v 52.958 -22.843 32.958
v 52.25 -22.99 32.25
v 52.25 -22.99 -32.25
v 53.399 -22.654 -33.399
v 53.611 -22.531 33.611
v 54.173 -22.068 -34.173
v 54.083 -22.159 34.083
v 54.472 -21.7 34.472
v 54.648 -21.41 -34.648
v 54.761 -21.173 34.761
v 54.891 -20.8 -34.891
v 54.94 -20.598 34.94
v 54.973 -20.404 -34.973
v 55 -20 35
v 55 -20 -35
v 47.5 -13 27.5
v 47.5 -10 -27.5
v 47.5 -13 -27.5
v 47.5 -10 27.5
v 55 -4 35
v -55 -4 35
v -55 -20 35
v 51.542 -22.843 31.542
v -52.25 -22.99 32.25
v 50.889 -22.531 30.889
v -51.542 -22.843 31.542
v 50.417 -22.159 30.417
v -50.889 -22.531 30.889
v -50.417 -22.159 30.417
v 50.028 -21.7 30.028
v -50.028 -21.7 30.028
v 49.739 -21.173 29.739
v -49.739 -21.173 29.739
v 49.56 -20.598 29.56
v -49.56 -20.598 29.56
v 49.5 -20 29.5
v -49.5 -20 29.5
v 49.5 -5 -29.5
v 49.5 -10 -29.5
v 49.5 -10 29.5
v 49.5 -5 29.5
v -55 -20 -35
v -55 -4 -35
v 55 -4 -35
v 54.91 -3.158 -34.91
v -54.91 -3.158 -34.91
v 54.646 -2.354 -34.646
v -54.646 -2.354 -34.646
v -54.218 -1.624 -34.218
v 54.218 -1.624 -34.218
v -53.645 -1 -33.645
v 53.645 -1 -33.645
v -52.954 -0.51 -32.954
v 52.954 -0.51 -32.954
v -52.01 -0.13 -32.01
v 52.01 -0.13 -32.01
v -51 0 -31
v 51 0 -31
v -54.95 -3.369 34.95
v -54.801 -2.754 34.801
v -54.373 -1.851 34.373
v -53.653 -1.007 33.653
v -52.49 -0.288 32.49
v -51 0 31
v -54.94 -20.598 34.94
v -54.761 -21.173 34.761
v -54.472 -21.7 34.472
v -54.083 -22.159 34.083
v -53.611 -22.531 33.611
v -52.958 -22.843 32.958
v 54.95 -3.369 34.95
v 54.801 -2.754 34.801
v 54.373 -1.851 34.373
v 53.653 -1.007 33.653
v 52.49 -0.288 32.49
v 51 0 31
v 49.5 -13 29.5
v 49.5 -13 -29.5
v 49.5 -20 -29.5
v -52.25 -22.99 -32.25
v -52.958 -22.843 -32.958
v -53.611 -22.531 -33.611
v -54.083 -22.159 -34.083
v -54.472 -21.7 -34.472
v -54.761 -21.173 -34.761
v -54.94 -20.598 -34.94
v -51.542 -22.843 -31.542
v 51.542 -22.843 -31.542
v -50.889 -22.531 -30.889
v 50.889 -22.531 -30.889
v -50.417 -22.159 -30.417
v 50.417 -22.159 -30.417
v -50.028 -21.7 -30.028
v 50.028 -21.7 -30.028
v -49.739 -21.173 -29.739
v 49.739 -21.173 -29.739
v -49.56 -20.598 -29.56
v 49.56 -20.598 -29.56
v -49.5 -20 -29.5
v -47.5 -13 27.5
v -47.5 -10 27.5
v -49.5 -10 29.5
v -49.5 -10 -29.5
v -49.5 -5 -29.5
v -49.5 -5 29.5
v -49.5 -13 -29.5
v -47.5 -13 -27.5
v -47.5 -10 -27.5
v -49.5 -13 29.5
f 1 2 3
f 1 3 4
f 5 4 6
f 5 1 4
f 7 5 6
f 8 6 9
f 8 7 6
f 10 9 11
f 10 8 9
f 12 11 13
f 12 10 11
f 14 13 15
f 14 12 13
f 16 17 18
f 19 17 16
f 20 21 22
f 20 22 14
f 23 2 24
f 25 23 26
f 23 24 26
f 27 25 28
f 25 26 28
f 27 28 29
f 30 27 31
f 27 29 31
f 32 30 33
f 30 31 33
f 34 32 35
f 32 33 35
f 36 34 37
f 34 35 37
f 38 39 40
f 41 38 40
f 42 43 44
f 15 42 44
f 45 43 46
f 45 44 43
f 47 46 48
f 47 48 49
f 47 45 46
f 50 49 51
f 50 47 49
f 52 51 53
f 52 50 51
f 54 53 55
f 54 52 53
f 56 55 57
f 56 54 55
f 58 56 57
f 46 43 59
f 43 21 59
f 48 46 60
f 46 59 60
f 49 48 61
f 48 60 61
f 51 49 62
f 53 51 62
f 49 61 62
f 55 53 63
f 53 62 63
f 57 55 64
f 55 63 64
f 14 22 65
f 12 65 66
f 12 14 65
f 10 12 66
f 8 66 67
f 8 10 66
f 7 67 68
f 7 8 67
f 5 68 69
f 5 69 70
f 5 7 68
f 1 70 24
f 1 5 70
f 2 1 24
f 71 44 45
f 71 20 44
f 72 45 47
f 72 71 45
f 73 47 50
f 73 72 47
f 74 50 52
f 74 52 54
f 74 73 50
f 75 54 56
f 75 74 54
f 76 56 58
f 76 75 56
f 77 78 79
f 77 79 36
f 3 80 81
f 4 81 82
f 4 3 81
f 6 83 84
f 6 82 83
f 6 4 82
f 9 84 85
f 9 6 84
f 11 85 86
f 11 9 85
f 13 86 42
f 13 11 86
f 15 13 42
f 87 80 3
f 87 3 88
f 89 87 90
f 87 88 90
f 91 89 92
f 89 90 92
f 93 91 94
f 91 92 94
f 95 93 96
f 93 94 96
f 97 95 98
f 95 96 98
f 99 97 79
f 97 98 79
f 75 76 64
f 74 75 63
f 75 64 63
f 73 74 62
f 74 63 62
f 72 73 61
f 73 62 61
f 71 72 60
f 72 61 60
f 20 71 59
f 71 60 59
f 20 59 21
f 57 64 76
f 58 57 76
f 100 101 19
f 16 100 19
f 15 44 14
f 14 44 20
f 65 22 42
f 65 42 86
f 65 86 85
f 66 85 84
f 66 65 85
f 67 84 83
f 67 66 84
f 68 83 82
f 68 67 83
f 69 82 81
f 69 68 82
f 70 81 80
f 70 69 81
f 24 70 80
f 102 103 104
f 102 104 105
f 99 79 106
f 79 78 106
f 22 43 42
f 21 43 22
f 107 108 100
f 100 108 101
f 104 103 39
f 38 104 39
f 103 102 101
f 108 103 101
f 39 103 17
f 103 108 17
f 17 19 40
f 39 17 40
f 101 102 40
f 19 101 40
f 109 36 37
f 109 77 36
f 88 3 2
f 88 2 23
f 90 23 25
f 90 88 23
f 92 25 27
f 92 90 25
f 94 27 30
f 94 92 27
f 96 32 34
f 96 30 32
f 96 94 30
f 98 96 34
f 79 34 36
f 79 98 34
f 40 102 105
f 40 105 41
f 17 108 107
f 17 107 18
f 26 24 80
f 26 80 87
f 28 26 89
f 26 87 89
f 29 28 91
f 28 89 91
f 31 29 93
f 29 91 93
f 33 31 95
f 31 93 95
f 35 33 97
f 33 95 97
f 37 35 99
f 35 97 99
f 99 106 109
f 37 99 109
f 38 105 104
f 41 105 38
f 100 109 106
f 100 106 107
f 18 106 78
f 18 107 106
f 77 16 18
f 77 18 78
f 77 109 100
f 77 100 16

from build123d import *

# Parameters (mm, degrees)
F0_W          = 55
F0_H          = 70
F1_DEPTH      = 10
F2_W          = 99
F2_H          = 59
F3_DEPTH      = 5
F4_W          = 110
F4_H          = 70
F4_W_2        = 99
F4_H_2        = 59
F4_W_3        = 95
F4_H_3        = 55
F5_DEPTH      = 3
F6_W          = 110
F6_H          = 70
F6_W_2        = 99
F6_H_2        = 59
F7_DEPTH      = 10
F8_R          = 4
F9_R          = 3
F10_T1_DEPTH  = 59
F10_T3_DEPTH  = 99
F10_T9_DEPTH  = 106.5
F10_T13_DEPTH = 66.5
F10_T20_DEPTH = 66.5
F10_T24_DEPTH = 106.5
F10_T31_DEPTH = 106.5
F10_T35_DEPTH = 66.5
F10_T42_DEPTH = 106.5
F10_T46_DEPTH = 66.5


# Not quite as in the source:
# - a fillet or chamfer that OpenCascade refuses, or shapes differently, is made with other operations: its cross-section is extruded or revolved along the edge and cut away or added


with BuildPart() as f1:
    # F0 (on Front) → F1 (new body)
    with BuildSketch(Plane.XZ):
        with Locations((-27.5, 0)):
            Rectangle(F0_W, F0_H)
        with Locations((27.5, 0)):
            Rectangle(F0_W, F0_H)
    extrude(amount=F1_DEPTH)

    # F2 (on face) → F3 (cut)
    with BuildSketch(Plane.XZ.offset(10)):
        Rectangle(F2_W, F2_H)
    extrude(amount=-F3_DEPTH, mode=Mode.SUBTRACT)

    # F4 (on face) → F5 (join)
    with BuildSketch(Plane.XZ.offset(10)):
        Rectangle(F4_W, F4_H)
        Rectangle(F4_W_2, F4_H_2, mode=Mode.SUBTRACT)
        Rectangle(F4_W_2, F4_H_2)
        Rectangle(F4_W_3, F4_H_3, mode=Mode.SUBTRACT)
    extrude(amount=F5_DEPTH)

    # F6 (on face) → F7 (join)
    with BuildSketch(Plane.XZ.offset(13)):
        Rectangle(F6_W, F6_H)
        Rectangle(F6_W_2, F6_H_2, mode=Mode.SUBTRACT)
    extrude(amount=F7_DEPTH)

    # F8
    f8_edges = [f1.edges().sort_by_distance(p)[0] for p in [
        (0, 0, 35),
        (-55, 0, 0),
        (55, 0, 0),
        (0, 0, -35),
    ]]
    fillet(f8_edges, radius=F8_R)

    # F9
    f9_edges = [f1.edges().sort_by_distance(p)[0] for p in [
        (-55, -23, 0),
        (0, -23, 35),
        (0, -23, -35),
        (55, -23, 0),
    ]]
    fillet(f9_edges, radius=F9_R)

    # F10: fillet of radius 3 on 4 edges, made by hand

    # F10_s2 → F10_t1 (cut)
    with BuildSketch(Plane.XY.offset(-29.5)):
        with BuildLine():
            ThreePointArc((-52.5, -23), (-50.3786796564, -22.1213203436), (-49.5, -20))
            Line((-49.5, -20), (-49.5, -23))
            Line((-49.5, -23), (-52.5, -23))
        make_face()
        with BuildLine():
            ThreePointArc((52.5, -23), (50.3786796564, -22.1213203436), (49.5, -20))
            Line((49.5, -20), (49.5, -23))
            Line((49.5, -23), (52.5, -23))
        make_face()
    extrude(amount=F10_T1_DEPTH, mode=Mode.SUBTRACT)

    # F10_s4 → F10_t3 (cut)
    with BuildSketch(Plane.YZ.offset(-49.5)):
        with BuildLine():
            ThreePointArc((-23, 32.5), (-22.1213203436, 30.3786796564), (-20, 29.5))
            Line((-20, 29.5), (-23, 29.5))
            Line((-23, 29.5), (-23, 32.5))
        make_face()
        with BuildLine():
            ThreePointArc((-23, -32.5), (-22.1213203436, -30.3786796564), (-20, -29.5))
            Line((-20, -29.5), (-23, -29.5))
            Line((-23, -29.5), (-23, -32.5))
        make_face()
    extrude(amount=F10_T3_DEPTH, mode=Mode.SUBTRACT)


with BuildPart() as f10_tool7:
    # F10_s8 → F10_t9 (new body)
    with BuildSketch(Plane.YZ.offset(49.5)):
        with BuildLine():
            ThreePointArc((-23, -32.5), (-22.1213203436, -30.3786796564), (-20, -29.5))
            Line((-20, -29.5), (-23, -29.5))
            Line((-23, -29.5), (-23, -32.5))
        make_face()
    extrude(amount=-F10_T9_DEPTH)

    split(bisect_by=Plane.YZ.offset(-49.5), keep=Keep.BOTTOM)


with BuildPart() as f10_tool11:
    # F10_s12 → F10_t13 (new body)
    with BuildSketch(Plane.XY.offset(-37)):
        with BuildLine():
            ThreePointArc((-52.5, -23), (-50.3786796564, -22.1213203436), (-49.5, -20))
            Line((-49.5, -20), (-49.5, -23))
            Line((-49.5, -23), (-52.5, -23))
        make_face()
    extrude(amount=F10_T13_DEPTH)

    split(bisect_by=Plane.XY.offset(-29.5), keep=Keep.BOTTOM)


with BuildPart() as f10_tool7_1:
    add(f10_tool7.part)

    # F10_t15: intersect F10_tool11
    add(f10_tool11.part, mode=Mode.INTERSECT)


with BuildPart() as f1_1:
    add(f1.part)

    # F10_t5: cut F10_tool7
    add(f10_tool7_1.part, mode=Mode.SUBTRACT)


with BuildPart() as f10_tool18:
    # F10_s19 → F10_t20 (new body)
    with BuildSketch(Plane.XY.offset(-29.5)):
        with BuildLine():
            ThreePointArc((-52.5, -23), (-50.3786796564, -22.1213203436), (-49.5, -20))
            Line((-49.5, -20), (-49.5, -23))
            Line((-49.5, -23), (-52.5, -23))
        make_face()
    extrude(amount=F10_T20_DEPTH)

    split(bisect_by=Plane.XY.offset(29.5), keep=Keep.TOP)


with BuildPart() as f10_tool22:
    # F10_s23 → F10_t24 (new body)
    with BuildSketch(Plane.YZ.offset(-57)):
        with BuildLine():
            ThreePointArc((-23, 32.5), (-22.1213203436, 30.3786796564), (-20, 29.5))
            Line((-20, 29.5), (-23, 29.5))
            Line((-23, 29.5), (-23, 32.5))
        make_face()
    extrude(amount=F10_T24_DEPTH)

    split(bisect_by=Plane.YZ.offset(-49.5), keep=Keep.BOTTOM)


with BuildPart() as f10_tool18_1:
    add(f10_tool18.part)

    # F10_t26: intersect F10_tool22
    add(f10_tool22.part, mode=Mode.INTERSECT)


with BuildPart() as f1_2:
    add(f1_1.part)

    # F10_t16: cut F10_tool18
    add(f10_tool18_1.part, mode=Mode.SUBTRACT)


with BuildPart() as f10_tool29:
    # F10_s30 → F10_t31 (new body)
    with BuildSketch(Plane.YZ.offset(-49.5)):
        with BuildLine():
            ThreePointArc((-23, 32.5), (-22.1213203436, 30.3786796564), (-20, 29.5))
            Line((-20, 29.5), (-23, 29.5))
            Line((-23, 29.5), (-23, 32.5))
        make_face()
    extrude(amount=F10_T31_DEPTH)

    split(bisect_by=Plane.YZ.offset(49.5), keep=Keep.TOP)


with BuildPart() as f10_tool33:
    # F10_s34 → F10_t35 (new body)
    with BuildSketch(Plane.XY.offset(37)):
        with BuildLine():
            ThreePointArc((52.5, -23), (50.3786796564, -22.1213203436), (49.5, -20))
            Line((49.5, -20), (49.5, -23))
            Line((49.5, -23), (52.5, -23))
        make_face()
    extrude(amount=-F10_T35_DEPTH)

    split(bisect_by=Plane.XY.offset(29.5), keep=Keep.TOP)


with BuildPart() as f10_tool29_1:
    add(f10_tool29.part)

    # F10_t37: intersect F10_tool33
    add(f10_tool33.part, mode=Mode.INTERSECT)


with BuildPart() as f1_3:
    add(f1_2.part)

    # F10_t27: cut F10_tool29
    add(f10_tool29_1.part, mode=Mode.SUBTRACT)


with BuildPart() as f10_tool40:
    # F10_s41 → F10_t42 (new body)
    with BuildSketch(Plane.YZ.offset(57)):
        with BuildLine():
            ThreePointArc((-23, -32.5), (-22.1213203436, -30.3786796564), (-20, -29.5))
            Line((-20, -29.5), (-23, -29.5))
            Line((-23, -29.5), (-23, -32.5))
        make_face()
    extrude(amount=-F10_T42_DEPTH)

    split(bisect_by=Plane.YZ.offset(49.5), keep=Keep.TOP)


with BuildPart() as f10_tool44:
    # F10_s45 → F10_t46 (new body)
    with BuildSketch(Plane.XY.offset(29.5)):
        with BuildLine():
            ThreePointArc((52.5, -23), (50.3786796564, -22.1213203436), (49.5, -20))
            Line((49.5, -20), (49.5, -23))
            Line((49.5, -23), (52.5, -23))
        make_face()
    extrude(amount=-F10_T46_DEPTH)

    split(bisect_by=Plane.XY.offset(-29.5), keep=Keep.BOTTOM)


with BuildPart() as f10_tool40_1:
    add(f10_tool40.part)

    # F10_t48: intersect F10_tool44
    add(f10_tool44.part, mode=Mode.INTERSECT)


with BuildPart() as f1_4:
    add(f1_3.part)

    # F10_t38: cut F10_tool40
    add(f10_tool40_1.part, mode=Mode.SUBTRACT)


solid = f1_4.part
